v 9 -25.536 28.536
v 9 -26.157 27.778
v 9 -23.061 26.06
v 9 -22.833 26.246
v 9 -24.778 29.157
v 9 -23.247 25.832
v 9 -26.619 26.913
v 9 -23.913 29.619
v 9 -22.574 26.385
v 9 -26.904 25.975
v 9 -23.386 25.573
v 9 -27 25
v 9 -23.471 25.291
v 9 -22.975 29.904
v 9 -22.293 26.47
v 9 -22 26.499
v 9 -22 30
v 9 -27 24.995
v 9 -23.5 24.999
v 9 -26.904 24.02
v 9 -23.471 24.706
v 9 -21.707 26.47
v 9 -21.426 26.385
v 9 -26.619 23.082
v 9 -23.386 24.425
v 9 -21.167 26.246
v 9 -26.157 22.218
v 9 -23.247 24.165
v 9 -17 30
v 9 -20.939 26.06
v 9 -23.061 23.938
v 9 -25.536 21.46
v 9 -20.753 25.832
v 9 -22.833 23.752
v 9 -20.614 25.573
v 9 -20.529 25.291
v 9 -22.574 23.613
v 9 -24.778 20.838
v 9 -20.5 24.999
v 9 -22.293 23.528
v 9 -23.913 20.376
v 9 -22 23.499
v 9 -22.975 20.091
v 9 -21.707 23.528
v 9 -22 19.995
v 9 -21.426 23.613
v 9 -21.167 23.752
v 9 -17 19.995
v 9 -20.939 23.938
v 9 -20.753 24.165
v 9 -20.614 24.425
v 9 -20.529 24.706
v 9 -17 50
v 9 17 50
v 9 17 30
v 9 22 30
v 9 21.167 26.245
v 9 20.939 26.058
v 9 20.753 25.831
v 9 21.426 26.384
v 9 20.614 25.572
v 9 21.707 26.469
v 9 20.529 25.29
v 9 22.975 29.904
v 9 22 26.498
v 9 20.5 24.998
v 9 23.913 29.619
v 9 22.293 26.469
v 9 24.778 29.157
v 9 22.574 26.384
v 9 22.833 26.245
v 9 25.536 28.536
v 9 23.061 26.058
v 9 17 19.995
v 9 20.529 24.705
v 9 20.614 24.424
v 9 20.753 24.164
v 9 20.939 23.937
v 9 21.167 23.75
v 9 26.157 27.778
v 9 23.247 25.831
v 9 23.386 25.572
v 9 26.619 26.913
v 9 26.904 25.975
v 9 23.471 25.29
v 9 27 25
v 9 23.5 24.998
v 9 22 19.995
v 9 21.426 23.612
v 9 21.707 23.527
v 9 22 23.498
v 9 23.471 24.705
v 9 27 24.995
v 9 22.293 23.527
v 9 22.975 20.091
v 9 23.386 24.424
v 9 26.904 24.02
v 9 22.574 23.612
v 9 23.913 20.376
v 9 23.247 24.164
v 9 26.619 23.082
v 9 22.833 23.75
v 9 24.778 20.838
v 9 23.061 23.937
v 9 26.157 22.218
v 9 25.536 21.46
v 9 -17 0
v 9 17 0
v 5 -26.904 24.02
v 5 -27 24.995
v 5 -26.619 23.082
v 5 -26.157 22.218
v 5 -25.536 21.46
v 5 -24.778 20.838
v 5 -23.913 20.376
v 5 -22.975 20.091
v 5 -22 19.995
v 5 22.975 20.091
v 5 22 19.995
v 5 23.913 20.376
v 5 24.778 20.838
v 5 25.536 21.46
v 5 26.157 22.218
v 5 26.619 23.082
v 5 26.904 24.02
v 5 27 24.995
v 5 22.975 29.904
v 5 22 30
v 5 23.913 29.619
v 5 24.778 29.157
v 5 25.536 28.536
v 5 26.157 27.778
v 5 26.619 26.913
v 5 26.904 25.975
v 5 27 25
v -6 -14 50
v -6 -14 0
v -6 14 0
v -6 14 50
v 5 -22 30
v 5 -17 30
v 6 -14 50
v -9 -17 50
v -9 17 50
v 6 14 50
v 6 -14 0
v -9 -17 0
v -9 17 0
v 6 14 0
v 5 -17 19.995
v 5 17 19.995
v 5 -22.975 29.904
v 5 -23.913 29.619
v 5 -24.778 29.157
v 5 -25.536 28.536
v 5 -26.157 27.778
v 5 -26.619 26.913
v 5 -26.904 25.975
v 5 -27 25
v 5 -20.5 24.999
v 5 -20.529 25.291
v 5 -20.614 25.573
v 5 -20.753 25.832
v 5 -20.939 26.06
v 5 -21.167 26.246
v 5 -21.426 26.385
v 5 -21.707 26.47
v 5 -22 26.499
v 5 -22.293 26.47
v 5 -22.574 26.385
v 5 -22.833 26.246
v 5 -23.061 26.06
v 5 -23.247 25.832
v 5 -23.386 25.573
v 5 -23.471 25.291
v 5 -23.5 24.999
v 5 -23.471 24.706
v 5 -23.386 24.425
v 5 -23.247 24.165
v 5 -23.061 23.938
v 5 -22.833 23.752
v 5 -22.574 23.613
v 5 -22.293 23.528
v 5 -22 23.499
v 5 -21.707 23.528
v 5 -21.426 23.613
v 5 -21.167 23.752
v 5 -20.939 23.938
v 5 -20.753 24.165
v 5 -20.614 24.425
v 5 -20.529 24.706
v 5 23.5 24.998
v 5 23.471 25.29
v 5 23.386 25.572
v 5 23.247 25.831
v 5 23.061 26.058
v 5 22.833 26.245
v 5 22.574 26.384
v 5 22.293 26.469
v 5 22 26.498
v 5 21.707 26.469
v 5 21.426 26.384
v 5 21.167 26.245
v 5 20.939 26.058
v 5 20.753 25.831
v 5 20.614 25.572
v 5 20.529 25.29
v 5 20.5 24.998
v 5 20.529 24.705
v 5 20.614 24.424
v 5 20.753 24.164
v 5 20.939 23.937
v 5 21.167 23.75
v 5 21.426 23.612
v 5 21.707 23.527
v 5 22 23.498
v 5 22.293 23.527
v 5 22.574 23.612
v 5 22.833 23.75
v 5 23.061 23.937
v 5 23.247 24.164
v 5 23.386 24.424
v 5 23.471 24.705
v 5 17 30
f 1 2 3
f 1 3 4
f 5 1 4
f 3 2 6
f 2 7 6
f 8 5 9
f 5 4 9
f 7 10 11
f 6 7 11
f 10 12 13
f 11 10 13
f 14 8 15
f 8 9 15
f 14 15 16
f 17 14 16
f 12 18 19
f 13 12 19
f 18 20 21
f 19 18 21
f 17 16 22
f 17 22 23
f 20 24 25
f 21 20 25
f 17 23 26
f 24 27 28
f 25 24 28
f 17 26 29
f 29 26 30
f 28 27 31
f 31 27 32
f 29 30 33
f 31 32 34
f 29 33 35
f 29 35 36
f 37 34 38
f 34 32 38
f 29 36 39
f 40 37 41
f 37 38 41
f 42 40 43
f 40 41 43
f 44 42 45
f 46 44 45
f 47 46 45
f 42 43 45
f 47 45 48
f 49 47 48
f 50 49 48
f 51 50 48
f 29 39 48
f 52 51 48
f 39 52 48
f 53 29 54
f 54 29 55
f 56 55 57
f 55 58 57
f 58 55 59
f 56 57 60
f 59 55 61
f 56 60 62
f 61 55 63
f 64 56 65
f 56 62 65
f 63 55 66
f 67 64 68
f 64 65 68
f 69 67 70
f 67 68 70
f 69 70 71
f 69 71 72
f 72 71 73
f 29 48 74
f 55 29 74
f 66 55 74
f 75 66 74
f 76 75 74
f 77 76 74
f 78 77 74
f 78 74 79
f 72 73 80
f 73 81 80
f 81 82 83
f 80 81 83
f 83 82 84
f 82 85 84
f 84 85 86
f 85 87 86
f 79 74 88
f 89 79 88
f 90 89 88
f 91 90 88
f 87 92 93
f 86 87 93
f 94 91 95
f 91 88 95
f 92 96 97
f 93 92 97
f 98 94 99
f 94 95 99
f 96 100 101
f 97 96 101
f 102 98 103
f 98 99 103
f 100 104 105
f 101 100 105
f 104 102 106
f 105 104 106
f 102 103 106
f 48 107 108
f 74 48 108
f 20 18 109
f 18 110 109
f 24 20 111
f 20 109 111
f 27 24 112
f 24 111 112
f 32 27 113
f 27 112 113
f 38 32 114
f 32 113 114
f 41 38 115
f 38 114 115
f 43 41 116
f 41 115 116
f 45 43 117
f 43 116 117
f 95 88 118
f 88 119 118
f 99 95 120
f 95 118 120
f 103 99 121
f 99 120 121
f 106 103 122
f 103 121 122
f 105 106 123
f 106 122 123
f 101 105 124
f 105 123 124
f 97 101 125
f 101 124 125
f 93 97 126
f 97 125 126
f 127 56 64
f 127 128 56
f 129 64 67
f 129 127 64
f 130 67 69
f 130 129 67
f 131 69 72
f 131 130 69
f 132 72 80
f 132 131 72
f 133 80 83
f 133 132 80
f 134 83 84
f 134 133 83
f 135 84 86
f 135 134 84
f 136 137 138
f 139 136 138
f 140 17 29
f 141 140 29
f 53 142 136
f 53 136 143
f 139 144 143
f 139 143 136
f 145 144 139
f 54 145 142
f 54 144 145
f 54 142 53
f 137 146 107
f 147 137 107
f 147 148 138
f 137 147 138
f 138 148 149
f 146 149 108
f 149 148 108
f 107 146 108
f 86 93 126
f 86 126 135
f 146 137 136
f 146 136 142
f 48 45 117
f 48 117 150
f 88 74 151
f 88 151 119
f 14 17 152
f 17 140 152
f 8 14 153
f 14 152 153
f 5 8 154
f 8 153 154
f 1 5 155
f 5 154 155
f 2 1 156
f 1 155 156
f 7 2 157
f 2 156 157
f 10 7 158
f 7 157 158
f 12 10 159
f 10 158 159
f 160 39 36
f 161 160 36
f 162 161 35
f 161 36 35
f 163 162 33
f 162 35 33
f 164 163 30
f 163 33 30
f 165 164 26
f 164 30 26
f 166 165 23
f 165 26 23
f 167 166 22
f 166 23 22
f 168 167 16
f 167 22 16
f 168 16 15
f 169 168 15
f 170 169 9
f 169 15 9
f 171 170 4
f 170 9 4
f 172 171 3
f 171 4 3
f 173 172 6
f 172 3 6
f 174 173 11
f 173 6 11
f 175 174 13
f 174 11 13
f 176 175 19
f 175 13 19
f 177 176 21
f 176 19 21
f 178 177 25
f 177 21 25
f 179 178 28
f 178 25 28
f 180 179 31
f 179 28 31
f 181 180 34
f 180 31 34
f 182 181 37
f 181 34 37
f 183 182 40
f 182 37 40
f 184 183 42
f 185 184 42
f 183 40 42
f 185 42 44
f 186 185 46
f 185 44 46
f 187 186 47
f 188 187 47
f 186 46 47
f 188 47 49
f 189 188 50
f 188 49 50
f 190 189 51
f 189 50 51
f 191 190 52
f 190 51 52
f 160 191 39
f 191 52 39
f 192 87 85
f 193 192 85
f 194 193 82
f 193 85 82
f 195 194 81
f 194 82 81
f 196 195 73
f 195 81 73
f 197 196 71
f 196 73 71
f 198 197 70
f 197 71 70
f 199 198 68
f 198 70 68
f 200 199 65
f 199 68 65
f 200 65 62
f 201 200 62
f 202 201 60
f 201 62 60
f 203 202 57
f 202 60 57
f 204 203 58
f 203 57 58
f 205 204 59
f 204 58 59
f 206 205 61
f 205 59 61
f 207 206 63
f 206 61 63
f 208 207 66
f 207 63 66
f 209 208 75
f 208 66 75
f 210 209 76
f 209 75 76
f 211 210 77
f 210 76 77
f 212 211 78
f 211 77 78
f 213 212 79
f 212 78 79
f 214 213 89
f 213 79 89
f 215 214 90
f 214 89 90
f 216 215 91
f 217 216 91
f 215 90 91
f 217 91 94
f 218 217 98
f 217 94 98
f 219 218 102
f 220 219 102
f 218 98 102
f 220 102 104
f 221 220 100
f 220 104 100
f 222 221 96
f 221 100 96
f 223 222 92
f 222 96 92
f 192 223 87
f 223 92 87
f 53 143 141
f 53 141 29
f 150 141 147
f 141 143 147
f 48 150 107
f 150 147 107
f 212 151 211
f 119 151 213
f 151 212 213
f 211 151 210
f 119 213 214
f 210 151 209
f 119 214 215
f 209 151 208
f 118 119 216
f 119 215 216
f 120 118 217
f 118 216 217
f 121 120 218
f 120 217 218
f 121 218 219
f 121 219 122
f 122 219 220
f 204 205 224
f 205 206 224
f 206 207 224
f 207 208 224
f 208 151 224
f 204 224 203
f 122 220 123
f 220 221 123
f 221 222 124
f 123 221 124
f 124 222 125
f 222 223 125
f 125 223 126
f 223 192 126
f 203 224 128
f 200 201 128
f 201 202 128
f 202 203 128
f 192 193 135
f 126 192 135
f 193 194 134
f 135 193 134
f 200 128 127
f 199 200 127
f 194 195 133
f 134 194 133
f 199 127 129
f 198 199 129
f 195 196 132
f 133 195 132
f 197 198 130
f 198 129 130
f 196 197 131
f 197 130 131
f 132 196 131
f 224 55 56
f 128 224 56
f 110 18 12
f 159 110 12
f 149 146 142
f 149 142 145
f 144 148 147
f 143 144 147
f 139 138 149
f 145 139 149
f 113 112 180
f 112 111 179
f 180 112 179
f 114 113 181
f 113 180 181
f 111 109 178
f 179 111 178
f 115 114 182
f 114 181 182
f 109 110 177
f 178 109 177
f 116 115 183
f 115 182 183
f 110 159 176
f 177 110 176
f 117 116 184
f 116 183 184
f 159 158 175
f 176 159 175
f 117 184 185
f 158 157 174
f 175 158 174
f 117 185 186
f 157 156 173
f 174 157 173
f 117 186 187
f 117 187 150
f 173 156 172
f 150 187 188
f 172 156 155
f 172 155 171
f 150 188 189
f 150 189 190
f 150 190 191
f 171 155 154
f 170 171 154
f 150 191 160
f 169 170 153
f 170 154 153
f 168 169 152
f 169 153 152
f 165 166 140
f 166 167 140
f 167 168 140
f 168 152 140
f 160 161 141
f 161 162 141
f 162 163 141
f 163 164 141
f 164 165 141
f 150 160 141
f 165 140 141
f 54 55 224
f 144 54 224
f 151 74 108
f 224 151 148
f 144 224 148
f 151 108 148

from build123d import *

# Parameters (mm, degrees)
F0_W     = 12
F0_H     = 28
F1_DEPTH = 50
F2_W     = 10
F2_H     = 10.004631
F2_R     = 1.5
F3_DEPTH = 4
F4_R     = 5
F5_R     = 5


with BuildPart() as f1:
    # F0 (on Top) → F1 (new body)
    with BuildSketch(Plane.XY):
        Polygon((-9, -17), (9, -17), (9, -5), (9, 5), (9, 17), (-9, 17), (-9, 5), (-9, -5), align=None)
        Rectangle(F0_W, F0_H, mode=Mode.SUBTRACT)
    extrude(amount=F1_DEPTH)

    # F2 (on face) → F3 (join)
    with BuildSketch(Plane.YZ.offset(9)):
        with Locations((-22, 24.997684)):
            Rectangle(F2_W, F2_H)
        with Locations((-22, 24.998842)):
            Circle(F2_R, mode=Mode.SUBTRACT)
        with Locations((22, 24.997684)):
            Rectangle(F2_W, F2_H)
        with Locations((22, 24.997685)):
            Circle(F2_R, mode=Mode.SUBTRACT)
    extrude(amount=-F3_DEPTH)

    # F4
    f4_edges = [f1.edges().sort_by_distance(p)[0] for p in [
        (7, 27, 19.995369),
        (7, 27, 30),
    ]]
    fillet(f4_edges, radius=F4_R)

    # F5
    f5_edges = [f1.edges().sort_by_distance(p)[0] for p in [
        (7, -27, 19.995369),
        (7, -27, 30),
    ]]
    fillet(f5_edges, radius=F5_R)


solid = f1.part
